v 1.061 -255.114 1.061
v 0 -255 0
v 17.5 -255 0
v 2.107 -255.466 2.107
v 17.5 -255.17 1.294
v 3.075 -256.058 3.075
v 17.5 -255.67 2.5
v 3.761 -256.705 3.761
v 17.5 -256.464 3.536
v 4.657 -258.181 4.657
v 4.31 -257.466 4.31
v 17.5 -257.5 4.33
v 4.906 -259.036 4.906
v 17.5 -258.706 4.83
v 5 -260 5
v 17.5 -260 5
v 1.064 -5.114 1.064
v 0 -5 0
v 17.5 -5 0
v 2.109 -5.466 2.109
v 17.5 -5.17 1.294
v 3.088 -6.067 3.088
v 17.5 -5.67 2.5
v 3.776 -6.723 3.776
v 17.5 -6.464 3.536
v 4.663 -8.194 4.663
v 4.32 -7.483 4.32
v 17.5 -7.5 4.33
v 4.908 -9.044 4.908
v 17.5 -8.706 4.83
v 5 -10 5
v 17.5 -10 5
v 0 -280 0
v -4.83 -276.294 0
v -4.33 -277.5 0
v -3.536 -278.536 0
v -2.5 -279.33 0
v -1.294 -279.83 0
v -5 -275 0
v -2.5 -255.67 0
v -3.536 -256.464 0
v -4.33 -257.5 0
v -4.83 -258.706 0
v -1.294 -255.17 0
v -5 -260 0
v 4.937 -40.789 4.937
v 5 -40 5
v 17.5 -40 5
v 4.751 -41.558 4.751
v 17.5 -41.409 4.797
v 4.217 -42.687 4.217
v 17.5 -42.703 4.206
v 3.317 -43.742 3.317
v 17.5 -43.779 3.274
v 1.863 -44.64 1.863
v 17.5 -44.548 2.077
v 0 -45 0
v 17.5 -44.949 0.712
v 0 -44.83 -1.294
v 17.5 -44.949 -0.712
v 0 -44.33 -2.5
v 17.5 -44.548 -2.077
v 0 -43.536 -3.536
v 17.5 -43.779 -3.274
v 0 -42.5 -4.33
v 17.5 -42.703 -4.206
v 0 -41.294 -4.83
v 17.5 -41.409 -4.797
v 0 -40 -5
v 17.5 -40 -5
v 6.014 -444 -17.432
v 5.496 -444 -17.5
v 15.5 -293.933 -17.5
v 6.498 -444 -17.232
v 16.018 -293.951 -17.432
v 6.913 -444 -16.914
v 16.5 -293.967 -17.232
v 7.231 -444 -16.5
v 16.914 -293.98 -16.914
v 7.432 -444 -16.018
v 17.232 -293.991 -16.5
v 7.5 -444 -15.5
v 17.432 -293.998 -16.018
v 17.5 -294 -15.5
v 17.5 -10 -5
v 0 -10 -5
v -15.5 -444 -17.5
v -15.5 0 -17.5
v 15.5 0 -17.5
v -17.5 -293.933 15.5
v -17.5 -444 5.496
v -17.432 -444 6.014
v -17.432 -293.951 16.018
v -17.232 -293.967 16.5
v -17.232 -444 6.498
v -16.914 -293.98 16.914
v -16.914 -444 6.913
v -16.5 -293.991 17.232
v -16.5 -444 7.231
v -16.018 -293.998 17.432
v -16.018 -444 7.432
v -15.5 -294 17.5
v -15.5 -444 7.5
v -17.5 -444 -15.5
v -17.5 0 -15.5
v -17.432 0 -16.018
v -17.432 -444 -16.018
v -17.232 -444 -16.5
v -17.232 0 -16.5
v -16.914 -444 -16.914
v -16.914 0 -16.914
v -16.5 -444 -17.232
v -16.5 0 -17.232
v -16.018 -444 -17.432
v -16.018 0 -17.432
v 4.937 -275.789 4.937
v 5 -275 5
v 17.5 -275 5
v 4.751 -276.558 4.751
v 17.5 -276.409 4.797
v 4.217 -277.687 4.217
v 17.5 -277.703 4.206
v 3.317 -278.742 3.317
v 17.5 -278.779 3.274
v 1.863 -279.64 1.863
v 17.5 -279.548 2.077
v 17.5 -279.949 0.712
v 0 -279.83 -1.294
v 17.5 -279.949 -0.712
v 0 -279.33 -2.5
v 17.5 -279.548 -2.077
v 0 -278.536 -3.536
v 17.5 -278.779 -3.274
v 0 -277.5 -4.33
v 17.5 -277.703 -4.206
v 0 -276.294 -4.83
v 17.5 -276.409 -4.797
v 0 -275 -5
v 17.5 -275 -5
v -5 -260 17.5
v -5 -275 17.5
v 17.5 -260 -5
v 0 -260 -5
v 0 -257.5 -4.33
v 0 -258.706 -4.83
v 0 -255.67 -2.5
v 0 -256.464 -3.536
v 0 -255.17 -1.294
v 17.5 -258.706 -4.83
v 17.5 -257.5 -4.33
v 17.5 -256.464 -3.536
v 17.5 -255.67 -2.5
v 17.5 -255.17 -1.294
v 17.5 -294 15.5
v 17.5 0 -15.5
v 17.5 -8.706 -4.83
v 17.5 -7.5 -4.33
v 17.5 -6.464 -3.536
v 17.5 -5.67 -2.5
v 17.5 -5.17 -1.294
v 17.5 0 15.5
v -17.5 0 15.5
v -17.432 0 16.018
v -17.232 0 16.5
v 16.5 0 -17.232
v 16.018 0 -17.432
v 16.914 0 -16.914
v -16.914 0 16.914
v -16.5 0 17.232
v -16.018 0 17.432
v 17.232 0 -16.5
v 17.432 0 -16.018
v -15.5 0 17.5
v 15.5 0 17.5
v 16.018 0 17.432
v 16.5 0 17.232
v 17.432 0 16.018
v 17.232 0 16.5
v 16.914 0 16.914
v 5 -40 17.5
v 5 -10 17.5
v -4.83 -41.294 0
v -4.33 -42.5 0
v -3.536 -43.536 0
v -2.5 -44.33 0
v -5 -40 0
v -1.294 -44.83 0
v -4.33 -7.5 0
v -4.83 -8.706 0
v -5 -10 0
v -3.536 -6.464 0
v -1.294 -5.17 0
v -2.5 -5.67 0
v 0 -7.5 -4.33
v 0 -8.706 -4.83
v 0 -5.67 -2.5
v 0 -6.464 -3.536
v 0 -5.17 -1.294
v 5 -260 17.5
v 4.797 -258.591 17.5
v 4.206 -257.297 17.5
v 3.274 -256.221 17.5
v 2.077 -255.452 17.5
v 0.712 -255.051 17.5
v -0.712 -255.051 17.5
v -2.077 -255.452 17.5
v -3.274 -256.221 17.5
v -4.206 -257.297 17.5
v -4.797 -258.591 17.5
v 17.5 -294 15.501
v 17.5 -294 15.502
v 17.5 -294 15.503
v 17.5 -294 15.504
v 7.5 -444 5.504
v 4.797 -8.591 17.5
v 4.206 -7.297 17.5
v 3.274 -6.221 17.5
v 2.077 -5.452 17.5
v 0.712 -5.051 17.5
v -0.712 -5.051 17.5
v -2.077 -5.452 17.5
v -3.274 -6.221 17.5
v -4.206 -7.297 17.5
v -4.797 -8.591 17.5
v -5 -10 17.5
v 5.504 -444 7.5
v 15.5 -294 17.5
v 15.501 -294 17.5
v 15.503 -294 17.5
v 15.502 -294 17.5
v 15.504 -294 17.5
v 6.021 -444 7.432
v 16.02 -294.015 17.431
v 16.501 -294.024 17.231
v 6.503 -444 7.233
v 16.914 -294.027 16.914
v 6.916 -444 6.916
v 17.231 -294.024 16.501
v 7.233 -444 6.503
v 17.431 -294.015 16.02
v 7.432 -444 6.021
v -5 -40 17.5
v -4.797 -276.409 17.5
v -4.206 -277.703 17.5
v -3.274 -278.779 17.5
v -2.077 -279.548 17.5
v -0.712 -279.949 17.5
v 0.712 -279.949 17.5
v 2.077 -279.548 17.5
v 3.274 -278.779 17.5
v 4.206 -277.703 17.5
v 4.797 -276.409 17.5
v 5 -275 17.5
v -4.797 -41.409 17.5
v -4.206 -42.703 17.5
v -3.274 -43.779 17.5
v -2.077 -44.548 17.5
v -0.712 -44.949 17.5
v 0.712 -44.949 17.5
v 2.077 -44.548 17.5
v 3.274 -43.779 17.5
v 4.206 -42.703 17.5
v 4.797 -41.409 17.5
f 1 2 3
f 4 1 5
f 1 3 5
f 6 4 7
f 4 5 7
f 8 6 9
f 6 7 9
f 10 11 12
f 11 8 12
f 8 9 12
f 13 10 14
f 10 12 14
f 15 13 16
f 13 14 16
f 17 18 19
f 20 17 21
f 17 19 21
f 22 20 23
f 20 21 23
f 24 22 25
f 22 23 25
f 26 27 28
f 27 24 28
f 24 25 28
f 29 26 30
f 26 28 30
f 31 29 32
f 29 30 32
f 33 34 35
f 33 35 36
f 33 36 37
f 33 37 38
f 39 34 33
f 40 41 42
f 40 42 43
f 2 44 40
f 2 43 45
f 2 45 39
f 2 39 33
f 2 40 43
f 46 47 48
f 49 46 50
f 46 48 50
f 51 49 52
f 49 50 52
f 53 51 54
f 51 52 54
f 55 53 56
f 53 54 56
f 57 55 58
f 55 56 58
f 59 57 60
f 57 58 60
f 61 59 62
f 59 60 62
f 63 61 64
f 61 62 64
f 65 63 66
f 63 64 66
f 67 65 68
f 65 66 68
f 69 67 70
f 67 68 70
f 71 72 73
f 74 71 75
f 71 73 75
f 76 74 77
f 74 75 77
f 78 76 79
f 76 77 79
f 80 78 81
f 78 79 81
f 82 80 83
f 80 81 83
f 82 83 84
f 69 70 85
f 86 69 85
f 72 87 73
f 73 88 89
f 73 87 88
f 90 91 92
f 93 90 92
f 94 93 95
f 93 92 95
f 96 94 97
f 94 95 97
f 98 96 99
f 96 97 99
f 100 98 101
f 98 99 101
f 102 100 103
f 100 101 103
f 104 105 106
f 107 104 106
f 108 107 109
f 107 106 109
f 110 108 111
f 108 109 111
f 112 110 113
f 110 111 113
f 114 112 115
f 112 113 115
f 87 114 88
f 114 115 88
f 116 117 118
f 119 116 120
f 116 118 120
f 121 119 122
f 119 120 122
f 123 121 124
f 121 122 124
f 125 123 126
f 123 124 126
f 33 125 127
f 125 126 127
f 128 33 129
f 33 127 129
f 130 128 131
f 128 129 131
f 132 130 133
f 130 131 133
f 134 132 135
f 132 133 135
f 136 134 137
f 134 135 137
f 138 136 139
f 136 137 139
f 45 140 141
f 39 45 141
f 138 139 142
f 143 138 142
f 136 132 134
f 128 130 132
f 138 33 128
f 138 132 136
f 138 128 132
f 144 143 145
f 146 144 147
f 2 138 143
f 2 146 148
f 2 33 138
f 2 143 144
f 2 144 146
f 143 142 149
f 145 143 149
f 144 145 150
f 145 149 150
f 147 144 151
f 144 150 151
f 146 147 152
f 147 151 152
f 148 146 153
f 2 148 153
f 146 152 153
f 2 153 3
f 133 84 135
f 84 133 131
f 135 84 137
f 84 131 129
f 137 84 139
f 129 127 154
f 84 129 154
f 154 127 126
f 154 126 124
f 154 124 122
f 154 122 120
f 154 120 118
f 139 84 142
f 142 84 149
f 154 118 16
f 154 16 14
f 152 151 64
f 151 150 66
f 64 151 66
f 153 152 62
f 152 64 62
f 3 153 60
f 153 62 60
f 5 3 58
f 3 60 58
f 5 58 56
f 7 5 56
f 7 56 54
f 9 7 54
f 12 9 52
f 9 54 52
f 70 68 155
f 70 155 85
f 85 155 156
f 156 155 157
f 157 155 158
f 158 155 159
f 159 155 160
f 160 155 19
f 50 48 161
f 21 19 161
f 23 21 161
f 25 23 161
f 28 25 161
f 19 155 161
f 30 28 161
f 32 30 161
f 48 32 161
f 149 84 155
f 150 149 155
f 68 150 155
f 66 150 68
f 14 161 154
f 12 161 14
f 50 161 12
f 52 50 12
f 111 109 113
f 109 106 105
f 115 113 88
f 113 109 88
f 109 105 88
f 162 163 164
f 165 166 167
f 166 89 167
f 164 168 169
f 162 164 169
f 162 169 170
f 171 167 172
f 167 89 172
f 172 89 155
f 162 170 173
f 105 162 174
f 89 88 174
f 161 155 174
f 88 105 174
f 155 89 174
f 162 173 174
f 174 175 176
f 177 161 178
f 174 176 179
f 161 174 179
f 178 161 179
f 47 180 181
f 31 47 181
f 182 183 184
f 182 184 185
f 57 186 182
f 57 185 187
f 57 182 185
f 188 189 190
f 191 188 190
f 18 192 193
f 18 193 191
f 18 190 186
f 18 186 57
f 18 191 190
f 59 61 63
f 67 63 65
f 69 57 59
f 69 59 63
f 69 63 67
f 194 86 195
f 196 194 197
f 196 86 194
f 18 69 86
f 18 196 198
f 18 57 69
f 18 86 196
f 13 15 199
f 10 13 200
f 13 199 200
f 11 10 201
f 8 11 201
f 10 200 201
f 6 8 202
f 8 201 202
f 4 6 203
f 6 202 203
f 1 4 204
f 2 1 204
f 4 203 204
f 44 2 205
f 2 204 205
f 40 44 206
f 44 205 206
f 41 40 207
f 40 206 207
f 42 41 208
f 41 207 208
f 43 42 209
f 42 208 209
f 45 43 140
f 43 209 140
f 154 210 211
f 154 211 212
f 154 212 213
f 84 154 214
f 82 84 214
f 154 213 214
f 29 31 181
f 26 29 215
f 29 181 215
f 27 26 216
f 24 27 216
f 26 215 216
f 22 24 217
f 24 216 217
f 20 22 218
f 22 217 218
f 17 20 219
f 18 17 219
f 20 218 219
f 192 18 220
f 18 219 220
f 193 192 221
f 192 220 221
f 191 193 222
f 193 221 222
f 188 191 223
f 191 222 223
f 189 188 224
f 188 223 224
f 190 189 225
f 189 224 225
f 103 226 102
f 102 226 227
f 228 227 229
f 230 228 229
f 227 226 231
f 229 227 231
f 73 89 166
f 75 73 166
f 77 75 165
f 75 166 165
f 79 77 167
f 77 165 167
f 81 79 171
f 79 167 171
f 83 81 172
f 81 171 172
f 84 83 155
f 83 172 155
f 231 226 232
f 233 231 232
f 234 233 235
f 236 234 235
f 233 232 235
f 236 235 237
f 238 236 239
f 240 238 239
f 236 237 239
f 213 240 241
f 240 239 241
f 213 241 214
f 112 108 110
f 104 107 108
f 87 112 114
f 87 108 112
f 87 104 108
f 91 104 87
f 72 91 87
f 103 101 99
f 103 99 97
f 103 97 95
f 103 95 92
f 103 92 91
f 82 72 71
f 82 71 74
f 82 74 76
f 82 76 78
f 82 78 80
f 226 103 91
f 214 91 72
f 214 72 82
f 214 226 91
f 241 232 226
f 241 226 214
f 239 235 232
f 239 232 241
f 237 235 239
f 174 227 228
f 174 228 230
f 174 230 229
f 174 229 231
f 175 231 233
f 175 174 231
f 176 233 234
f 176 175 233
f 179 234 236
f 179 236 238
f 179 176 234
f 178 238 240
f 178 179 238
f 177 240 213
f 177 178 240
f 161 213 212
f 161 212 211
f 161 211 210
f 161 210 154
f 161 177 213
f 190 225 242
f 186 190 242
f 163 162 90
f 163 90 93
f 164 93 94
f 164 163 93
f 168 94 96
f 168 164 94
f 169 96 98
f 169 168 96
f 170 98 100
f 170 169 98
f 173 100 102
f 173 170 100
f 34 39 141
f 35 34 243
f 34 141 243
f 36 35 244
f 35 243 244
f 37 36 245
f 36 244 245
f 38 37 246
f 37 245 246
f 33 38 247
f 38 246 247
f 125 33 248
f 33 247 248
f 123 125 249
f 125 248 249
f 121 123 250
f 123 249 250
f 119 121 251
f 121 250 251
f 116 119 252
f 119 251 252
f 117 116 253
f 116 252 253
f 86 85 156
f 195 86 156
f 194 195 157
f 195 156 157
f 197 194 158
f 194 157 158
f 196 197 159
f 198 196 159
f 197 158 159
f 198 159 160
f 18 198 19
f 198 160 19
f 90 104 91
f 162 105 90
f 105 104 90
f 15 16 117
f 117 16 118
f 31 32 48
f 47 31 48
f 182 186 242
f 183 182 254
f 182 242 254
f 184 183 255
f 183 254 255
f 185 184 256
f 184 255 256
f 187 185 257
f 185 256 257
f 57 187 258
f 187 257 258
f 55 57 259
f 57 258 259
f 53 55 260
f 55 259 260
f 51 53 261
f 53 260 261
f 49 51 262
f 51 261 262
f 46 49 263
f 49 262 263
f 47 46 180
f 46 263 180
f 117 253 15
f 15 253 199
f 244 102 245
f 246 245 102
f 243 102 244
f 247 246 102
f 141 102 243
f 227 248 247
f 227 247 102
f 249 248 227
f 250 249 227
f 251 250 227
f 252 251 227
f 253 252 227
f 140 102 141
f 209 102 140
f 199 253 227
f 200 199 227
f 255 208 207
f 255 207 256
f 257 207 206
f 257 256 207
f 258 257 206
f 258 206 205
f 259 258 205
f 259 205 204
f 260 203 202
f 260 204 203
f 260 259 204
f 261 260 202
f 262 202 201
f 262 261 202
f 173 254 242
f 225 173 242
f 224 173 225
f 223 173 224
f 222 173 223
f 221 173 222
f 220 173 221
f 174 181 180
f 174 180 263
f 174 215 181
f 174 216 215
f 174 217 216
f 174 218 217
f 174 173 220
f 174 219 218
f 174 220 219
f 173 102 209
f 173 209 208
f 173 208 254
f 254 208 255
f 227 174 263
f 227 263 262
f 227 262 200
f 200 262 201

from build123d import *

# Parameters (mm, degrees)
F0_W         = 35
F0_H         = 35
F1_DEPTH     = 444
F3_DEPTH     = 35
F5_DEPTH     = 35
F7_DEPTH     = 17.5
F10_DEPTH    = 17.5
F11_T1_DEPTH = 160.3329637837
F11_T3_DEPTH = 304
F11_T5_DEPTH = 160.3329637837
F11_T7_DEPTH = 160.6210414072
F11_T9_DEPTH = 454


# Not quite as in the source:
# - a fillet or chamfer that OpenCascade refuses, or shapes differently, is made with other operations: its cross-section is extruded or revolved along the edge and cut away or added


with BuildPart() as f1:
    # F0 (on Front) → F1 (new body)
    with BuildSketch(Plane.XZ):
        Rectangle(F0_W, F0_H)
    extrude(amount=F1_DEPTH)

    # F2 (on face) → F3 (cut)
    with BuildSketch(Plane.YZ.offset(17.5)):
        Polygon((-444, 7.5), (-294, 17.5), (-444, 17.5), align=None)
    extrude(amount=-F3_DEPTH, mode=Mode.SUBTRACT)

    # F4 (on face) → F5 (cut)
    with BuildSketch(Plane.XY.offset(17.5)):
        Polygon((17.5, -444), (17.5, -294), (7.5, -444), align=None)
    extrude(amount=-F5_DEPTH, mode=Mode.SUBTRACT)

    # F6 (on face) → F7 (cut)
    with BuildSketch(Plane.XY.offset(17.5)):
        with BuildLine():
            ThreePointArc((5, -275), (0, -270), (-5, -275))
            Line((-5, -275), (5, -275))
        make_face()
        with BuildLine():
            Line((-5, -260), (-5, -275))
            ThreePointArc((-5, -275), (0, -270), (5, -275))
            Line((5, -275), (5, -260))
            ThreePointArc((5, -260), (0, -265), (-5, -260))
        make_face()
        with BuildLine():
            Line((5, -275), (-5, -275))
            ThreePointArc((-5, -275), (0, -280), (5, -275))
        make_face()
        with BuildLine():
            ThreePointArc((5, -260), (0, -255), (-5, -260))
            Line((-5, -260), (5, -260))
        make_face()
        with BuildLine():
            Line((5, -260), (-5, -260))
            ThreePointArc((-5, -260), (0, -265), (5, -260))
        make_face()
        with BuildLine():
            ThreePointArc((5, -40), (0, -35), (-5, -40))
            Line((-5, -40), (5, -40))
        make_face()
        with BuildLine():
            Line((-5, -10), (-5, -40))
            ThreePointArc((-5, -40), (0, -35), (5, -40))
            Line((5, -40), (5, -10))
            ThreePointArc((5, -10), (0, -15), (-5, -10))
        make_face()
        with BuildLine():
            Line((5, -40), (-5, -40))
            ThreePointArc((-5, -40), (0, -45), (5, -40))
        make_face()
        with BuildLine():
            ThreePointArc((5, -10), (0, -5), (-5, -10))
            Line((-5, -10), (5, -10))
        make_face()
        with BuildLine():
            Line((5, -10), (-5, -10))
            ThreePointArc((-5, -10), (0, -15), (5, -10))
        make_face()
    extrude(amount=-F7_DEPTH, mode=Mode.SUBTRACT)

    # F9 (on face) → F10 (cut)
    with BuildSketch(Plane.YZ.offset(17.5)):
        with BuildLine():
            ThreePointArc((-270, 0), (-271.4644660941, -3.5355339059), (-275, -5))
            Line((-275, -5), (-260, -5))
            ThreePointArc((-260, -5), (-265, 0), (-260, 5))
            Line((-260, 5), (-275, 5))
            ThreePointArc((-275, 5), (-271.4644660941, 3.5355339059), (-270, 0))
        make_face()
        with BuildLine():
            ThreePointArc((-275, 5), (-280, 0), (-275, -5))
            Line((-275, -5), (-275, 5))
        make_face()
        with BuildLine():
            Line((-275, 5), (-275, -5))
            ThreePointArc((-275, -5), (-271.4644660941, -3.5355339059), (-270, 0))
            ThreePointArc((-270, 0), (-271.4644660941, 3.5355339059), (-275, 5))
        make_face()
        with BuildLine():
            ThreePointArc((-260, 5), (-265, 0), (-260, -5))
            Line((-260, -5), (-260, 5))
        make_face()
        with BuildLine():
            Line((-260, 5), (-260, -5))
            ThreePointArc((-260, -5), (-256.4644660941, -3.5355339059), (-255, 0))
            ThreePointArc((-255, 0), (-256.4644660941, 3.5355339059), (-260, 5))
        make_face()
        with BuildLine():
            ThreePointArc((-35, 0), (-36.4644660941, -3.5355339059), (-40, -5))
            Line((-40, -5), (-10, -5))
            ThreePointArc((-10, -5), (-15, 0), (-10, 5))
            Line((-10, 5), (-40, 5))
            ThreePointArc((-40, 5), (-36.4644660941, 3.5355339059), (-35, 0))
        make_face()
        with BuildLine():
            ThreePointArc((-40, 5), (-45, 0), (-40, -5))
            Line((-40, -5), (-40, 5))
        make_face()
        with BuildLine():
            Line((-40, 5), (-40, -5))
            ThreePointArc((-40, -5), (-36.4644660941, -3.5355339059), (-35, 0))
            ThreePointArc((-35, 0), (-36.4644660941, 3.5355339059), (-40, 5))
        make_face()
        with BuildLine():
            ThreePointArc((-10, 5), (-15, 0), (-10, -5))
            Line((-10, -5), (-10, 5))
        make_face()
        with BuildLine():
            Line((-10, 5), (-10, -5))
            ThreePointArc((-10, -5), (-6.4644660941, -3.5355339059), (-5, 0))
            ThreePointArc((-5, 0), (-6.4644660941, 3.5355339059), (-10, 5))
        make_face()
    extrude(amount=-F10_DEPTH, mode=Mode.SUBTRACT)

    # F11: fillet of radius 2 on 7 edges, made by hand

    # F11_s2 → F11_t1 (cut)
    with BuildSketch(Plane(origin=(0, -446.5265364088, -29.7684357606), x_dir=(1, 0, 0), z_dir=(0, 0.9977851579, 0.0665190105))):
        with BuildLine():
            ThreePointArc((-17.5, -35.0178293565), (-16.9142135624, -36.4320429189), (-15.5, -37.0178293565))
            Line((-15.5, -37.0178293565), (-17.5, -37.0178293565))
            Line((-17.5, -37.0178293565), (-17.5, -35.0178293565))
        make_face()
    extrude(amount=F11_T1_DEPTH, mode=Mode.SUBTRACT)

    # F11_s4 → F11_t3 (cut)
    with BuildSketch(Plane.XZ.offset(-5)):
        with BuildLine():
            ThreePointArc((-17.5, 15.5), (-16.9142135624, 16.9142135624), (-15.5, 17.5))
            Line((-15.5, 17.5), (-17.5, 17.5))
            Line((-17.5, 17.5), (-17.5, 15.5))
        make_face()
        with BuildLine():
            ThreePointArc((15.5, 17.5), (16.9142135624, 16.9142135624), (17.5, 15.5))
            Line((17.5, 15.5), (17.5, 17.5))
            Line((17.5, 17.5), (15.5, 17.5))
        make_face()
        with BuildLine():
            ThreePointArc((15.5, -17.5), (16.9142135624, -16.9142135624), (17.5, -15.5))
            Line((17.5, -15.5), (17.5, -17.5))
            Line((17.5, -17.5), (15.5, -17.5))
        make_face()
    extrude(amount=F11_T3_DEPTH, mode=Mode.SUBTRACT)

    # F11_s6 → F11_t5 (cut)
    with BuildSketch(Plane(origin=(-19.1032456553, -286.5486848302, 0), x_dir=(0, 0, 1), z_dir=(-0.0665190105, -0.9977851579, 0))):
        with BuildLine():
            ThreePointArc((-17.5, -35.0178293565), (-16.9142135624, -36.4320429189), (-15.5, -37.0178293565))
            Line((-15.5, -37.0178293565), (-17.5, -37.0178293565))
            Line((-17.5, -37.0178293565), (-17.5, -35.0178293565))
        make_face()
    extrude(amount=F11_T5_DEPTH, mode=Mode.SUBTRACT)

    # F11_s8 → F11_t7 (cut)
    with BuildSketch(Plane(origin=(-29.6035242291, -444.0528634361, -29.6035242291), x_dir=(-0.9977851579, 0.0665190105, 0), z_dir=(0.0663723312, 0.9955849674, 0.0663723312))):
        with BuildLine():
            ThreePointArc((-35.026678914, 36.8632049195), (-36.4351682565, 36.2743058009), (-37.0178293565, 34.8632244983))
            Line((-37.0178293565, 34.8632244983), (-37.0178293565, 36.8543944331))
            Line((-37.0178293565, 36.8543944331), (-35.026678914, 36.8632049195))
        make_face()
    extrude(amount=F11_T7_DEPTH, mode=Mode.SUBTRACT)

    # F11_s10 → F11_t9 (cut)
    with BuildSketch(Plane.XZ.offset(-5)):
        with BuildLine():
            ThreePointArc((-17.5, -15.5), (-16.9142135624, -16.9142135624), (-15.5, -17.5))
            Line((-15.5, -17.5), (-17.5, -17.5))
            Line((-17.5, -17.5), (-17.5, -15.5))
        make_face()
    extrude(amount=F11_T9_DEPTH, mode=Mode.SUBTRACT)


solid = f1.part
